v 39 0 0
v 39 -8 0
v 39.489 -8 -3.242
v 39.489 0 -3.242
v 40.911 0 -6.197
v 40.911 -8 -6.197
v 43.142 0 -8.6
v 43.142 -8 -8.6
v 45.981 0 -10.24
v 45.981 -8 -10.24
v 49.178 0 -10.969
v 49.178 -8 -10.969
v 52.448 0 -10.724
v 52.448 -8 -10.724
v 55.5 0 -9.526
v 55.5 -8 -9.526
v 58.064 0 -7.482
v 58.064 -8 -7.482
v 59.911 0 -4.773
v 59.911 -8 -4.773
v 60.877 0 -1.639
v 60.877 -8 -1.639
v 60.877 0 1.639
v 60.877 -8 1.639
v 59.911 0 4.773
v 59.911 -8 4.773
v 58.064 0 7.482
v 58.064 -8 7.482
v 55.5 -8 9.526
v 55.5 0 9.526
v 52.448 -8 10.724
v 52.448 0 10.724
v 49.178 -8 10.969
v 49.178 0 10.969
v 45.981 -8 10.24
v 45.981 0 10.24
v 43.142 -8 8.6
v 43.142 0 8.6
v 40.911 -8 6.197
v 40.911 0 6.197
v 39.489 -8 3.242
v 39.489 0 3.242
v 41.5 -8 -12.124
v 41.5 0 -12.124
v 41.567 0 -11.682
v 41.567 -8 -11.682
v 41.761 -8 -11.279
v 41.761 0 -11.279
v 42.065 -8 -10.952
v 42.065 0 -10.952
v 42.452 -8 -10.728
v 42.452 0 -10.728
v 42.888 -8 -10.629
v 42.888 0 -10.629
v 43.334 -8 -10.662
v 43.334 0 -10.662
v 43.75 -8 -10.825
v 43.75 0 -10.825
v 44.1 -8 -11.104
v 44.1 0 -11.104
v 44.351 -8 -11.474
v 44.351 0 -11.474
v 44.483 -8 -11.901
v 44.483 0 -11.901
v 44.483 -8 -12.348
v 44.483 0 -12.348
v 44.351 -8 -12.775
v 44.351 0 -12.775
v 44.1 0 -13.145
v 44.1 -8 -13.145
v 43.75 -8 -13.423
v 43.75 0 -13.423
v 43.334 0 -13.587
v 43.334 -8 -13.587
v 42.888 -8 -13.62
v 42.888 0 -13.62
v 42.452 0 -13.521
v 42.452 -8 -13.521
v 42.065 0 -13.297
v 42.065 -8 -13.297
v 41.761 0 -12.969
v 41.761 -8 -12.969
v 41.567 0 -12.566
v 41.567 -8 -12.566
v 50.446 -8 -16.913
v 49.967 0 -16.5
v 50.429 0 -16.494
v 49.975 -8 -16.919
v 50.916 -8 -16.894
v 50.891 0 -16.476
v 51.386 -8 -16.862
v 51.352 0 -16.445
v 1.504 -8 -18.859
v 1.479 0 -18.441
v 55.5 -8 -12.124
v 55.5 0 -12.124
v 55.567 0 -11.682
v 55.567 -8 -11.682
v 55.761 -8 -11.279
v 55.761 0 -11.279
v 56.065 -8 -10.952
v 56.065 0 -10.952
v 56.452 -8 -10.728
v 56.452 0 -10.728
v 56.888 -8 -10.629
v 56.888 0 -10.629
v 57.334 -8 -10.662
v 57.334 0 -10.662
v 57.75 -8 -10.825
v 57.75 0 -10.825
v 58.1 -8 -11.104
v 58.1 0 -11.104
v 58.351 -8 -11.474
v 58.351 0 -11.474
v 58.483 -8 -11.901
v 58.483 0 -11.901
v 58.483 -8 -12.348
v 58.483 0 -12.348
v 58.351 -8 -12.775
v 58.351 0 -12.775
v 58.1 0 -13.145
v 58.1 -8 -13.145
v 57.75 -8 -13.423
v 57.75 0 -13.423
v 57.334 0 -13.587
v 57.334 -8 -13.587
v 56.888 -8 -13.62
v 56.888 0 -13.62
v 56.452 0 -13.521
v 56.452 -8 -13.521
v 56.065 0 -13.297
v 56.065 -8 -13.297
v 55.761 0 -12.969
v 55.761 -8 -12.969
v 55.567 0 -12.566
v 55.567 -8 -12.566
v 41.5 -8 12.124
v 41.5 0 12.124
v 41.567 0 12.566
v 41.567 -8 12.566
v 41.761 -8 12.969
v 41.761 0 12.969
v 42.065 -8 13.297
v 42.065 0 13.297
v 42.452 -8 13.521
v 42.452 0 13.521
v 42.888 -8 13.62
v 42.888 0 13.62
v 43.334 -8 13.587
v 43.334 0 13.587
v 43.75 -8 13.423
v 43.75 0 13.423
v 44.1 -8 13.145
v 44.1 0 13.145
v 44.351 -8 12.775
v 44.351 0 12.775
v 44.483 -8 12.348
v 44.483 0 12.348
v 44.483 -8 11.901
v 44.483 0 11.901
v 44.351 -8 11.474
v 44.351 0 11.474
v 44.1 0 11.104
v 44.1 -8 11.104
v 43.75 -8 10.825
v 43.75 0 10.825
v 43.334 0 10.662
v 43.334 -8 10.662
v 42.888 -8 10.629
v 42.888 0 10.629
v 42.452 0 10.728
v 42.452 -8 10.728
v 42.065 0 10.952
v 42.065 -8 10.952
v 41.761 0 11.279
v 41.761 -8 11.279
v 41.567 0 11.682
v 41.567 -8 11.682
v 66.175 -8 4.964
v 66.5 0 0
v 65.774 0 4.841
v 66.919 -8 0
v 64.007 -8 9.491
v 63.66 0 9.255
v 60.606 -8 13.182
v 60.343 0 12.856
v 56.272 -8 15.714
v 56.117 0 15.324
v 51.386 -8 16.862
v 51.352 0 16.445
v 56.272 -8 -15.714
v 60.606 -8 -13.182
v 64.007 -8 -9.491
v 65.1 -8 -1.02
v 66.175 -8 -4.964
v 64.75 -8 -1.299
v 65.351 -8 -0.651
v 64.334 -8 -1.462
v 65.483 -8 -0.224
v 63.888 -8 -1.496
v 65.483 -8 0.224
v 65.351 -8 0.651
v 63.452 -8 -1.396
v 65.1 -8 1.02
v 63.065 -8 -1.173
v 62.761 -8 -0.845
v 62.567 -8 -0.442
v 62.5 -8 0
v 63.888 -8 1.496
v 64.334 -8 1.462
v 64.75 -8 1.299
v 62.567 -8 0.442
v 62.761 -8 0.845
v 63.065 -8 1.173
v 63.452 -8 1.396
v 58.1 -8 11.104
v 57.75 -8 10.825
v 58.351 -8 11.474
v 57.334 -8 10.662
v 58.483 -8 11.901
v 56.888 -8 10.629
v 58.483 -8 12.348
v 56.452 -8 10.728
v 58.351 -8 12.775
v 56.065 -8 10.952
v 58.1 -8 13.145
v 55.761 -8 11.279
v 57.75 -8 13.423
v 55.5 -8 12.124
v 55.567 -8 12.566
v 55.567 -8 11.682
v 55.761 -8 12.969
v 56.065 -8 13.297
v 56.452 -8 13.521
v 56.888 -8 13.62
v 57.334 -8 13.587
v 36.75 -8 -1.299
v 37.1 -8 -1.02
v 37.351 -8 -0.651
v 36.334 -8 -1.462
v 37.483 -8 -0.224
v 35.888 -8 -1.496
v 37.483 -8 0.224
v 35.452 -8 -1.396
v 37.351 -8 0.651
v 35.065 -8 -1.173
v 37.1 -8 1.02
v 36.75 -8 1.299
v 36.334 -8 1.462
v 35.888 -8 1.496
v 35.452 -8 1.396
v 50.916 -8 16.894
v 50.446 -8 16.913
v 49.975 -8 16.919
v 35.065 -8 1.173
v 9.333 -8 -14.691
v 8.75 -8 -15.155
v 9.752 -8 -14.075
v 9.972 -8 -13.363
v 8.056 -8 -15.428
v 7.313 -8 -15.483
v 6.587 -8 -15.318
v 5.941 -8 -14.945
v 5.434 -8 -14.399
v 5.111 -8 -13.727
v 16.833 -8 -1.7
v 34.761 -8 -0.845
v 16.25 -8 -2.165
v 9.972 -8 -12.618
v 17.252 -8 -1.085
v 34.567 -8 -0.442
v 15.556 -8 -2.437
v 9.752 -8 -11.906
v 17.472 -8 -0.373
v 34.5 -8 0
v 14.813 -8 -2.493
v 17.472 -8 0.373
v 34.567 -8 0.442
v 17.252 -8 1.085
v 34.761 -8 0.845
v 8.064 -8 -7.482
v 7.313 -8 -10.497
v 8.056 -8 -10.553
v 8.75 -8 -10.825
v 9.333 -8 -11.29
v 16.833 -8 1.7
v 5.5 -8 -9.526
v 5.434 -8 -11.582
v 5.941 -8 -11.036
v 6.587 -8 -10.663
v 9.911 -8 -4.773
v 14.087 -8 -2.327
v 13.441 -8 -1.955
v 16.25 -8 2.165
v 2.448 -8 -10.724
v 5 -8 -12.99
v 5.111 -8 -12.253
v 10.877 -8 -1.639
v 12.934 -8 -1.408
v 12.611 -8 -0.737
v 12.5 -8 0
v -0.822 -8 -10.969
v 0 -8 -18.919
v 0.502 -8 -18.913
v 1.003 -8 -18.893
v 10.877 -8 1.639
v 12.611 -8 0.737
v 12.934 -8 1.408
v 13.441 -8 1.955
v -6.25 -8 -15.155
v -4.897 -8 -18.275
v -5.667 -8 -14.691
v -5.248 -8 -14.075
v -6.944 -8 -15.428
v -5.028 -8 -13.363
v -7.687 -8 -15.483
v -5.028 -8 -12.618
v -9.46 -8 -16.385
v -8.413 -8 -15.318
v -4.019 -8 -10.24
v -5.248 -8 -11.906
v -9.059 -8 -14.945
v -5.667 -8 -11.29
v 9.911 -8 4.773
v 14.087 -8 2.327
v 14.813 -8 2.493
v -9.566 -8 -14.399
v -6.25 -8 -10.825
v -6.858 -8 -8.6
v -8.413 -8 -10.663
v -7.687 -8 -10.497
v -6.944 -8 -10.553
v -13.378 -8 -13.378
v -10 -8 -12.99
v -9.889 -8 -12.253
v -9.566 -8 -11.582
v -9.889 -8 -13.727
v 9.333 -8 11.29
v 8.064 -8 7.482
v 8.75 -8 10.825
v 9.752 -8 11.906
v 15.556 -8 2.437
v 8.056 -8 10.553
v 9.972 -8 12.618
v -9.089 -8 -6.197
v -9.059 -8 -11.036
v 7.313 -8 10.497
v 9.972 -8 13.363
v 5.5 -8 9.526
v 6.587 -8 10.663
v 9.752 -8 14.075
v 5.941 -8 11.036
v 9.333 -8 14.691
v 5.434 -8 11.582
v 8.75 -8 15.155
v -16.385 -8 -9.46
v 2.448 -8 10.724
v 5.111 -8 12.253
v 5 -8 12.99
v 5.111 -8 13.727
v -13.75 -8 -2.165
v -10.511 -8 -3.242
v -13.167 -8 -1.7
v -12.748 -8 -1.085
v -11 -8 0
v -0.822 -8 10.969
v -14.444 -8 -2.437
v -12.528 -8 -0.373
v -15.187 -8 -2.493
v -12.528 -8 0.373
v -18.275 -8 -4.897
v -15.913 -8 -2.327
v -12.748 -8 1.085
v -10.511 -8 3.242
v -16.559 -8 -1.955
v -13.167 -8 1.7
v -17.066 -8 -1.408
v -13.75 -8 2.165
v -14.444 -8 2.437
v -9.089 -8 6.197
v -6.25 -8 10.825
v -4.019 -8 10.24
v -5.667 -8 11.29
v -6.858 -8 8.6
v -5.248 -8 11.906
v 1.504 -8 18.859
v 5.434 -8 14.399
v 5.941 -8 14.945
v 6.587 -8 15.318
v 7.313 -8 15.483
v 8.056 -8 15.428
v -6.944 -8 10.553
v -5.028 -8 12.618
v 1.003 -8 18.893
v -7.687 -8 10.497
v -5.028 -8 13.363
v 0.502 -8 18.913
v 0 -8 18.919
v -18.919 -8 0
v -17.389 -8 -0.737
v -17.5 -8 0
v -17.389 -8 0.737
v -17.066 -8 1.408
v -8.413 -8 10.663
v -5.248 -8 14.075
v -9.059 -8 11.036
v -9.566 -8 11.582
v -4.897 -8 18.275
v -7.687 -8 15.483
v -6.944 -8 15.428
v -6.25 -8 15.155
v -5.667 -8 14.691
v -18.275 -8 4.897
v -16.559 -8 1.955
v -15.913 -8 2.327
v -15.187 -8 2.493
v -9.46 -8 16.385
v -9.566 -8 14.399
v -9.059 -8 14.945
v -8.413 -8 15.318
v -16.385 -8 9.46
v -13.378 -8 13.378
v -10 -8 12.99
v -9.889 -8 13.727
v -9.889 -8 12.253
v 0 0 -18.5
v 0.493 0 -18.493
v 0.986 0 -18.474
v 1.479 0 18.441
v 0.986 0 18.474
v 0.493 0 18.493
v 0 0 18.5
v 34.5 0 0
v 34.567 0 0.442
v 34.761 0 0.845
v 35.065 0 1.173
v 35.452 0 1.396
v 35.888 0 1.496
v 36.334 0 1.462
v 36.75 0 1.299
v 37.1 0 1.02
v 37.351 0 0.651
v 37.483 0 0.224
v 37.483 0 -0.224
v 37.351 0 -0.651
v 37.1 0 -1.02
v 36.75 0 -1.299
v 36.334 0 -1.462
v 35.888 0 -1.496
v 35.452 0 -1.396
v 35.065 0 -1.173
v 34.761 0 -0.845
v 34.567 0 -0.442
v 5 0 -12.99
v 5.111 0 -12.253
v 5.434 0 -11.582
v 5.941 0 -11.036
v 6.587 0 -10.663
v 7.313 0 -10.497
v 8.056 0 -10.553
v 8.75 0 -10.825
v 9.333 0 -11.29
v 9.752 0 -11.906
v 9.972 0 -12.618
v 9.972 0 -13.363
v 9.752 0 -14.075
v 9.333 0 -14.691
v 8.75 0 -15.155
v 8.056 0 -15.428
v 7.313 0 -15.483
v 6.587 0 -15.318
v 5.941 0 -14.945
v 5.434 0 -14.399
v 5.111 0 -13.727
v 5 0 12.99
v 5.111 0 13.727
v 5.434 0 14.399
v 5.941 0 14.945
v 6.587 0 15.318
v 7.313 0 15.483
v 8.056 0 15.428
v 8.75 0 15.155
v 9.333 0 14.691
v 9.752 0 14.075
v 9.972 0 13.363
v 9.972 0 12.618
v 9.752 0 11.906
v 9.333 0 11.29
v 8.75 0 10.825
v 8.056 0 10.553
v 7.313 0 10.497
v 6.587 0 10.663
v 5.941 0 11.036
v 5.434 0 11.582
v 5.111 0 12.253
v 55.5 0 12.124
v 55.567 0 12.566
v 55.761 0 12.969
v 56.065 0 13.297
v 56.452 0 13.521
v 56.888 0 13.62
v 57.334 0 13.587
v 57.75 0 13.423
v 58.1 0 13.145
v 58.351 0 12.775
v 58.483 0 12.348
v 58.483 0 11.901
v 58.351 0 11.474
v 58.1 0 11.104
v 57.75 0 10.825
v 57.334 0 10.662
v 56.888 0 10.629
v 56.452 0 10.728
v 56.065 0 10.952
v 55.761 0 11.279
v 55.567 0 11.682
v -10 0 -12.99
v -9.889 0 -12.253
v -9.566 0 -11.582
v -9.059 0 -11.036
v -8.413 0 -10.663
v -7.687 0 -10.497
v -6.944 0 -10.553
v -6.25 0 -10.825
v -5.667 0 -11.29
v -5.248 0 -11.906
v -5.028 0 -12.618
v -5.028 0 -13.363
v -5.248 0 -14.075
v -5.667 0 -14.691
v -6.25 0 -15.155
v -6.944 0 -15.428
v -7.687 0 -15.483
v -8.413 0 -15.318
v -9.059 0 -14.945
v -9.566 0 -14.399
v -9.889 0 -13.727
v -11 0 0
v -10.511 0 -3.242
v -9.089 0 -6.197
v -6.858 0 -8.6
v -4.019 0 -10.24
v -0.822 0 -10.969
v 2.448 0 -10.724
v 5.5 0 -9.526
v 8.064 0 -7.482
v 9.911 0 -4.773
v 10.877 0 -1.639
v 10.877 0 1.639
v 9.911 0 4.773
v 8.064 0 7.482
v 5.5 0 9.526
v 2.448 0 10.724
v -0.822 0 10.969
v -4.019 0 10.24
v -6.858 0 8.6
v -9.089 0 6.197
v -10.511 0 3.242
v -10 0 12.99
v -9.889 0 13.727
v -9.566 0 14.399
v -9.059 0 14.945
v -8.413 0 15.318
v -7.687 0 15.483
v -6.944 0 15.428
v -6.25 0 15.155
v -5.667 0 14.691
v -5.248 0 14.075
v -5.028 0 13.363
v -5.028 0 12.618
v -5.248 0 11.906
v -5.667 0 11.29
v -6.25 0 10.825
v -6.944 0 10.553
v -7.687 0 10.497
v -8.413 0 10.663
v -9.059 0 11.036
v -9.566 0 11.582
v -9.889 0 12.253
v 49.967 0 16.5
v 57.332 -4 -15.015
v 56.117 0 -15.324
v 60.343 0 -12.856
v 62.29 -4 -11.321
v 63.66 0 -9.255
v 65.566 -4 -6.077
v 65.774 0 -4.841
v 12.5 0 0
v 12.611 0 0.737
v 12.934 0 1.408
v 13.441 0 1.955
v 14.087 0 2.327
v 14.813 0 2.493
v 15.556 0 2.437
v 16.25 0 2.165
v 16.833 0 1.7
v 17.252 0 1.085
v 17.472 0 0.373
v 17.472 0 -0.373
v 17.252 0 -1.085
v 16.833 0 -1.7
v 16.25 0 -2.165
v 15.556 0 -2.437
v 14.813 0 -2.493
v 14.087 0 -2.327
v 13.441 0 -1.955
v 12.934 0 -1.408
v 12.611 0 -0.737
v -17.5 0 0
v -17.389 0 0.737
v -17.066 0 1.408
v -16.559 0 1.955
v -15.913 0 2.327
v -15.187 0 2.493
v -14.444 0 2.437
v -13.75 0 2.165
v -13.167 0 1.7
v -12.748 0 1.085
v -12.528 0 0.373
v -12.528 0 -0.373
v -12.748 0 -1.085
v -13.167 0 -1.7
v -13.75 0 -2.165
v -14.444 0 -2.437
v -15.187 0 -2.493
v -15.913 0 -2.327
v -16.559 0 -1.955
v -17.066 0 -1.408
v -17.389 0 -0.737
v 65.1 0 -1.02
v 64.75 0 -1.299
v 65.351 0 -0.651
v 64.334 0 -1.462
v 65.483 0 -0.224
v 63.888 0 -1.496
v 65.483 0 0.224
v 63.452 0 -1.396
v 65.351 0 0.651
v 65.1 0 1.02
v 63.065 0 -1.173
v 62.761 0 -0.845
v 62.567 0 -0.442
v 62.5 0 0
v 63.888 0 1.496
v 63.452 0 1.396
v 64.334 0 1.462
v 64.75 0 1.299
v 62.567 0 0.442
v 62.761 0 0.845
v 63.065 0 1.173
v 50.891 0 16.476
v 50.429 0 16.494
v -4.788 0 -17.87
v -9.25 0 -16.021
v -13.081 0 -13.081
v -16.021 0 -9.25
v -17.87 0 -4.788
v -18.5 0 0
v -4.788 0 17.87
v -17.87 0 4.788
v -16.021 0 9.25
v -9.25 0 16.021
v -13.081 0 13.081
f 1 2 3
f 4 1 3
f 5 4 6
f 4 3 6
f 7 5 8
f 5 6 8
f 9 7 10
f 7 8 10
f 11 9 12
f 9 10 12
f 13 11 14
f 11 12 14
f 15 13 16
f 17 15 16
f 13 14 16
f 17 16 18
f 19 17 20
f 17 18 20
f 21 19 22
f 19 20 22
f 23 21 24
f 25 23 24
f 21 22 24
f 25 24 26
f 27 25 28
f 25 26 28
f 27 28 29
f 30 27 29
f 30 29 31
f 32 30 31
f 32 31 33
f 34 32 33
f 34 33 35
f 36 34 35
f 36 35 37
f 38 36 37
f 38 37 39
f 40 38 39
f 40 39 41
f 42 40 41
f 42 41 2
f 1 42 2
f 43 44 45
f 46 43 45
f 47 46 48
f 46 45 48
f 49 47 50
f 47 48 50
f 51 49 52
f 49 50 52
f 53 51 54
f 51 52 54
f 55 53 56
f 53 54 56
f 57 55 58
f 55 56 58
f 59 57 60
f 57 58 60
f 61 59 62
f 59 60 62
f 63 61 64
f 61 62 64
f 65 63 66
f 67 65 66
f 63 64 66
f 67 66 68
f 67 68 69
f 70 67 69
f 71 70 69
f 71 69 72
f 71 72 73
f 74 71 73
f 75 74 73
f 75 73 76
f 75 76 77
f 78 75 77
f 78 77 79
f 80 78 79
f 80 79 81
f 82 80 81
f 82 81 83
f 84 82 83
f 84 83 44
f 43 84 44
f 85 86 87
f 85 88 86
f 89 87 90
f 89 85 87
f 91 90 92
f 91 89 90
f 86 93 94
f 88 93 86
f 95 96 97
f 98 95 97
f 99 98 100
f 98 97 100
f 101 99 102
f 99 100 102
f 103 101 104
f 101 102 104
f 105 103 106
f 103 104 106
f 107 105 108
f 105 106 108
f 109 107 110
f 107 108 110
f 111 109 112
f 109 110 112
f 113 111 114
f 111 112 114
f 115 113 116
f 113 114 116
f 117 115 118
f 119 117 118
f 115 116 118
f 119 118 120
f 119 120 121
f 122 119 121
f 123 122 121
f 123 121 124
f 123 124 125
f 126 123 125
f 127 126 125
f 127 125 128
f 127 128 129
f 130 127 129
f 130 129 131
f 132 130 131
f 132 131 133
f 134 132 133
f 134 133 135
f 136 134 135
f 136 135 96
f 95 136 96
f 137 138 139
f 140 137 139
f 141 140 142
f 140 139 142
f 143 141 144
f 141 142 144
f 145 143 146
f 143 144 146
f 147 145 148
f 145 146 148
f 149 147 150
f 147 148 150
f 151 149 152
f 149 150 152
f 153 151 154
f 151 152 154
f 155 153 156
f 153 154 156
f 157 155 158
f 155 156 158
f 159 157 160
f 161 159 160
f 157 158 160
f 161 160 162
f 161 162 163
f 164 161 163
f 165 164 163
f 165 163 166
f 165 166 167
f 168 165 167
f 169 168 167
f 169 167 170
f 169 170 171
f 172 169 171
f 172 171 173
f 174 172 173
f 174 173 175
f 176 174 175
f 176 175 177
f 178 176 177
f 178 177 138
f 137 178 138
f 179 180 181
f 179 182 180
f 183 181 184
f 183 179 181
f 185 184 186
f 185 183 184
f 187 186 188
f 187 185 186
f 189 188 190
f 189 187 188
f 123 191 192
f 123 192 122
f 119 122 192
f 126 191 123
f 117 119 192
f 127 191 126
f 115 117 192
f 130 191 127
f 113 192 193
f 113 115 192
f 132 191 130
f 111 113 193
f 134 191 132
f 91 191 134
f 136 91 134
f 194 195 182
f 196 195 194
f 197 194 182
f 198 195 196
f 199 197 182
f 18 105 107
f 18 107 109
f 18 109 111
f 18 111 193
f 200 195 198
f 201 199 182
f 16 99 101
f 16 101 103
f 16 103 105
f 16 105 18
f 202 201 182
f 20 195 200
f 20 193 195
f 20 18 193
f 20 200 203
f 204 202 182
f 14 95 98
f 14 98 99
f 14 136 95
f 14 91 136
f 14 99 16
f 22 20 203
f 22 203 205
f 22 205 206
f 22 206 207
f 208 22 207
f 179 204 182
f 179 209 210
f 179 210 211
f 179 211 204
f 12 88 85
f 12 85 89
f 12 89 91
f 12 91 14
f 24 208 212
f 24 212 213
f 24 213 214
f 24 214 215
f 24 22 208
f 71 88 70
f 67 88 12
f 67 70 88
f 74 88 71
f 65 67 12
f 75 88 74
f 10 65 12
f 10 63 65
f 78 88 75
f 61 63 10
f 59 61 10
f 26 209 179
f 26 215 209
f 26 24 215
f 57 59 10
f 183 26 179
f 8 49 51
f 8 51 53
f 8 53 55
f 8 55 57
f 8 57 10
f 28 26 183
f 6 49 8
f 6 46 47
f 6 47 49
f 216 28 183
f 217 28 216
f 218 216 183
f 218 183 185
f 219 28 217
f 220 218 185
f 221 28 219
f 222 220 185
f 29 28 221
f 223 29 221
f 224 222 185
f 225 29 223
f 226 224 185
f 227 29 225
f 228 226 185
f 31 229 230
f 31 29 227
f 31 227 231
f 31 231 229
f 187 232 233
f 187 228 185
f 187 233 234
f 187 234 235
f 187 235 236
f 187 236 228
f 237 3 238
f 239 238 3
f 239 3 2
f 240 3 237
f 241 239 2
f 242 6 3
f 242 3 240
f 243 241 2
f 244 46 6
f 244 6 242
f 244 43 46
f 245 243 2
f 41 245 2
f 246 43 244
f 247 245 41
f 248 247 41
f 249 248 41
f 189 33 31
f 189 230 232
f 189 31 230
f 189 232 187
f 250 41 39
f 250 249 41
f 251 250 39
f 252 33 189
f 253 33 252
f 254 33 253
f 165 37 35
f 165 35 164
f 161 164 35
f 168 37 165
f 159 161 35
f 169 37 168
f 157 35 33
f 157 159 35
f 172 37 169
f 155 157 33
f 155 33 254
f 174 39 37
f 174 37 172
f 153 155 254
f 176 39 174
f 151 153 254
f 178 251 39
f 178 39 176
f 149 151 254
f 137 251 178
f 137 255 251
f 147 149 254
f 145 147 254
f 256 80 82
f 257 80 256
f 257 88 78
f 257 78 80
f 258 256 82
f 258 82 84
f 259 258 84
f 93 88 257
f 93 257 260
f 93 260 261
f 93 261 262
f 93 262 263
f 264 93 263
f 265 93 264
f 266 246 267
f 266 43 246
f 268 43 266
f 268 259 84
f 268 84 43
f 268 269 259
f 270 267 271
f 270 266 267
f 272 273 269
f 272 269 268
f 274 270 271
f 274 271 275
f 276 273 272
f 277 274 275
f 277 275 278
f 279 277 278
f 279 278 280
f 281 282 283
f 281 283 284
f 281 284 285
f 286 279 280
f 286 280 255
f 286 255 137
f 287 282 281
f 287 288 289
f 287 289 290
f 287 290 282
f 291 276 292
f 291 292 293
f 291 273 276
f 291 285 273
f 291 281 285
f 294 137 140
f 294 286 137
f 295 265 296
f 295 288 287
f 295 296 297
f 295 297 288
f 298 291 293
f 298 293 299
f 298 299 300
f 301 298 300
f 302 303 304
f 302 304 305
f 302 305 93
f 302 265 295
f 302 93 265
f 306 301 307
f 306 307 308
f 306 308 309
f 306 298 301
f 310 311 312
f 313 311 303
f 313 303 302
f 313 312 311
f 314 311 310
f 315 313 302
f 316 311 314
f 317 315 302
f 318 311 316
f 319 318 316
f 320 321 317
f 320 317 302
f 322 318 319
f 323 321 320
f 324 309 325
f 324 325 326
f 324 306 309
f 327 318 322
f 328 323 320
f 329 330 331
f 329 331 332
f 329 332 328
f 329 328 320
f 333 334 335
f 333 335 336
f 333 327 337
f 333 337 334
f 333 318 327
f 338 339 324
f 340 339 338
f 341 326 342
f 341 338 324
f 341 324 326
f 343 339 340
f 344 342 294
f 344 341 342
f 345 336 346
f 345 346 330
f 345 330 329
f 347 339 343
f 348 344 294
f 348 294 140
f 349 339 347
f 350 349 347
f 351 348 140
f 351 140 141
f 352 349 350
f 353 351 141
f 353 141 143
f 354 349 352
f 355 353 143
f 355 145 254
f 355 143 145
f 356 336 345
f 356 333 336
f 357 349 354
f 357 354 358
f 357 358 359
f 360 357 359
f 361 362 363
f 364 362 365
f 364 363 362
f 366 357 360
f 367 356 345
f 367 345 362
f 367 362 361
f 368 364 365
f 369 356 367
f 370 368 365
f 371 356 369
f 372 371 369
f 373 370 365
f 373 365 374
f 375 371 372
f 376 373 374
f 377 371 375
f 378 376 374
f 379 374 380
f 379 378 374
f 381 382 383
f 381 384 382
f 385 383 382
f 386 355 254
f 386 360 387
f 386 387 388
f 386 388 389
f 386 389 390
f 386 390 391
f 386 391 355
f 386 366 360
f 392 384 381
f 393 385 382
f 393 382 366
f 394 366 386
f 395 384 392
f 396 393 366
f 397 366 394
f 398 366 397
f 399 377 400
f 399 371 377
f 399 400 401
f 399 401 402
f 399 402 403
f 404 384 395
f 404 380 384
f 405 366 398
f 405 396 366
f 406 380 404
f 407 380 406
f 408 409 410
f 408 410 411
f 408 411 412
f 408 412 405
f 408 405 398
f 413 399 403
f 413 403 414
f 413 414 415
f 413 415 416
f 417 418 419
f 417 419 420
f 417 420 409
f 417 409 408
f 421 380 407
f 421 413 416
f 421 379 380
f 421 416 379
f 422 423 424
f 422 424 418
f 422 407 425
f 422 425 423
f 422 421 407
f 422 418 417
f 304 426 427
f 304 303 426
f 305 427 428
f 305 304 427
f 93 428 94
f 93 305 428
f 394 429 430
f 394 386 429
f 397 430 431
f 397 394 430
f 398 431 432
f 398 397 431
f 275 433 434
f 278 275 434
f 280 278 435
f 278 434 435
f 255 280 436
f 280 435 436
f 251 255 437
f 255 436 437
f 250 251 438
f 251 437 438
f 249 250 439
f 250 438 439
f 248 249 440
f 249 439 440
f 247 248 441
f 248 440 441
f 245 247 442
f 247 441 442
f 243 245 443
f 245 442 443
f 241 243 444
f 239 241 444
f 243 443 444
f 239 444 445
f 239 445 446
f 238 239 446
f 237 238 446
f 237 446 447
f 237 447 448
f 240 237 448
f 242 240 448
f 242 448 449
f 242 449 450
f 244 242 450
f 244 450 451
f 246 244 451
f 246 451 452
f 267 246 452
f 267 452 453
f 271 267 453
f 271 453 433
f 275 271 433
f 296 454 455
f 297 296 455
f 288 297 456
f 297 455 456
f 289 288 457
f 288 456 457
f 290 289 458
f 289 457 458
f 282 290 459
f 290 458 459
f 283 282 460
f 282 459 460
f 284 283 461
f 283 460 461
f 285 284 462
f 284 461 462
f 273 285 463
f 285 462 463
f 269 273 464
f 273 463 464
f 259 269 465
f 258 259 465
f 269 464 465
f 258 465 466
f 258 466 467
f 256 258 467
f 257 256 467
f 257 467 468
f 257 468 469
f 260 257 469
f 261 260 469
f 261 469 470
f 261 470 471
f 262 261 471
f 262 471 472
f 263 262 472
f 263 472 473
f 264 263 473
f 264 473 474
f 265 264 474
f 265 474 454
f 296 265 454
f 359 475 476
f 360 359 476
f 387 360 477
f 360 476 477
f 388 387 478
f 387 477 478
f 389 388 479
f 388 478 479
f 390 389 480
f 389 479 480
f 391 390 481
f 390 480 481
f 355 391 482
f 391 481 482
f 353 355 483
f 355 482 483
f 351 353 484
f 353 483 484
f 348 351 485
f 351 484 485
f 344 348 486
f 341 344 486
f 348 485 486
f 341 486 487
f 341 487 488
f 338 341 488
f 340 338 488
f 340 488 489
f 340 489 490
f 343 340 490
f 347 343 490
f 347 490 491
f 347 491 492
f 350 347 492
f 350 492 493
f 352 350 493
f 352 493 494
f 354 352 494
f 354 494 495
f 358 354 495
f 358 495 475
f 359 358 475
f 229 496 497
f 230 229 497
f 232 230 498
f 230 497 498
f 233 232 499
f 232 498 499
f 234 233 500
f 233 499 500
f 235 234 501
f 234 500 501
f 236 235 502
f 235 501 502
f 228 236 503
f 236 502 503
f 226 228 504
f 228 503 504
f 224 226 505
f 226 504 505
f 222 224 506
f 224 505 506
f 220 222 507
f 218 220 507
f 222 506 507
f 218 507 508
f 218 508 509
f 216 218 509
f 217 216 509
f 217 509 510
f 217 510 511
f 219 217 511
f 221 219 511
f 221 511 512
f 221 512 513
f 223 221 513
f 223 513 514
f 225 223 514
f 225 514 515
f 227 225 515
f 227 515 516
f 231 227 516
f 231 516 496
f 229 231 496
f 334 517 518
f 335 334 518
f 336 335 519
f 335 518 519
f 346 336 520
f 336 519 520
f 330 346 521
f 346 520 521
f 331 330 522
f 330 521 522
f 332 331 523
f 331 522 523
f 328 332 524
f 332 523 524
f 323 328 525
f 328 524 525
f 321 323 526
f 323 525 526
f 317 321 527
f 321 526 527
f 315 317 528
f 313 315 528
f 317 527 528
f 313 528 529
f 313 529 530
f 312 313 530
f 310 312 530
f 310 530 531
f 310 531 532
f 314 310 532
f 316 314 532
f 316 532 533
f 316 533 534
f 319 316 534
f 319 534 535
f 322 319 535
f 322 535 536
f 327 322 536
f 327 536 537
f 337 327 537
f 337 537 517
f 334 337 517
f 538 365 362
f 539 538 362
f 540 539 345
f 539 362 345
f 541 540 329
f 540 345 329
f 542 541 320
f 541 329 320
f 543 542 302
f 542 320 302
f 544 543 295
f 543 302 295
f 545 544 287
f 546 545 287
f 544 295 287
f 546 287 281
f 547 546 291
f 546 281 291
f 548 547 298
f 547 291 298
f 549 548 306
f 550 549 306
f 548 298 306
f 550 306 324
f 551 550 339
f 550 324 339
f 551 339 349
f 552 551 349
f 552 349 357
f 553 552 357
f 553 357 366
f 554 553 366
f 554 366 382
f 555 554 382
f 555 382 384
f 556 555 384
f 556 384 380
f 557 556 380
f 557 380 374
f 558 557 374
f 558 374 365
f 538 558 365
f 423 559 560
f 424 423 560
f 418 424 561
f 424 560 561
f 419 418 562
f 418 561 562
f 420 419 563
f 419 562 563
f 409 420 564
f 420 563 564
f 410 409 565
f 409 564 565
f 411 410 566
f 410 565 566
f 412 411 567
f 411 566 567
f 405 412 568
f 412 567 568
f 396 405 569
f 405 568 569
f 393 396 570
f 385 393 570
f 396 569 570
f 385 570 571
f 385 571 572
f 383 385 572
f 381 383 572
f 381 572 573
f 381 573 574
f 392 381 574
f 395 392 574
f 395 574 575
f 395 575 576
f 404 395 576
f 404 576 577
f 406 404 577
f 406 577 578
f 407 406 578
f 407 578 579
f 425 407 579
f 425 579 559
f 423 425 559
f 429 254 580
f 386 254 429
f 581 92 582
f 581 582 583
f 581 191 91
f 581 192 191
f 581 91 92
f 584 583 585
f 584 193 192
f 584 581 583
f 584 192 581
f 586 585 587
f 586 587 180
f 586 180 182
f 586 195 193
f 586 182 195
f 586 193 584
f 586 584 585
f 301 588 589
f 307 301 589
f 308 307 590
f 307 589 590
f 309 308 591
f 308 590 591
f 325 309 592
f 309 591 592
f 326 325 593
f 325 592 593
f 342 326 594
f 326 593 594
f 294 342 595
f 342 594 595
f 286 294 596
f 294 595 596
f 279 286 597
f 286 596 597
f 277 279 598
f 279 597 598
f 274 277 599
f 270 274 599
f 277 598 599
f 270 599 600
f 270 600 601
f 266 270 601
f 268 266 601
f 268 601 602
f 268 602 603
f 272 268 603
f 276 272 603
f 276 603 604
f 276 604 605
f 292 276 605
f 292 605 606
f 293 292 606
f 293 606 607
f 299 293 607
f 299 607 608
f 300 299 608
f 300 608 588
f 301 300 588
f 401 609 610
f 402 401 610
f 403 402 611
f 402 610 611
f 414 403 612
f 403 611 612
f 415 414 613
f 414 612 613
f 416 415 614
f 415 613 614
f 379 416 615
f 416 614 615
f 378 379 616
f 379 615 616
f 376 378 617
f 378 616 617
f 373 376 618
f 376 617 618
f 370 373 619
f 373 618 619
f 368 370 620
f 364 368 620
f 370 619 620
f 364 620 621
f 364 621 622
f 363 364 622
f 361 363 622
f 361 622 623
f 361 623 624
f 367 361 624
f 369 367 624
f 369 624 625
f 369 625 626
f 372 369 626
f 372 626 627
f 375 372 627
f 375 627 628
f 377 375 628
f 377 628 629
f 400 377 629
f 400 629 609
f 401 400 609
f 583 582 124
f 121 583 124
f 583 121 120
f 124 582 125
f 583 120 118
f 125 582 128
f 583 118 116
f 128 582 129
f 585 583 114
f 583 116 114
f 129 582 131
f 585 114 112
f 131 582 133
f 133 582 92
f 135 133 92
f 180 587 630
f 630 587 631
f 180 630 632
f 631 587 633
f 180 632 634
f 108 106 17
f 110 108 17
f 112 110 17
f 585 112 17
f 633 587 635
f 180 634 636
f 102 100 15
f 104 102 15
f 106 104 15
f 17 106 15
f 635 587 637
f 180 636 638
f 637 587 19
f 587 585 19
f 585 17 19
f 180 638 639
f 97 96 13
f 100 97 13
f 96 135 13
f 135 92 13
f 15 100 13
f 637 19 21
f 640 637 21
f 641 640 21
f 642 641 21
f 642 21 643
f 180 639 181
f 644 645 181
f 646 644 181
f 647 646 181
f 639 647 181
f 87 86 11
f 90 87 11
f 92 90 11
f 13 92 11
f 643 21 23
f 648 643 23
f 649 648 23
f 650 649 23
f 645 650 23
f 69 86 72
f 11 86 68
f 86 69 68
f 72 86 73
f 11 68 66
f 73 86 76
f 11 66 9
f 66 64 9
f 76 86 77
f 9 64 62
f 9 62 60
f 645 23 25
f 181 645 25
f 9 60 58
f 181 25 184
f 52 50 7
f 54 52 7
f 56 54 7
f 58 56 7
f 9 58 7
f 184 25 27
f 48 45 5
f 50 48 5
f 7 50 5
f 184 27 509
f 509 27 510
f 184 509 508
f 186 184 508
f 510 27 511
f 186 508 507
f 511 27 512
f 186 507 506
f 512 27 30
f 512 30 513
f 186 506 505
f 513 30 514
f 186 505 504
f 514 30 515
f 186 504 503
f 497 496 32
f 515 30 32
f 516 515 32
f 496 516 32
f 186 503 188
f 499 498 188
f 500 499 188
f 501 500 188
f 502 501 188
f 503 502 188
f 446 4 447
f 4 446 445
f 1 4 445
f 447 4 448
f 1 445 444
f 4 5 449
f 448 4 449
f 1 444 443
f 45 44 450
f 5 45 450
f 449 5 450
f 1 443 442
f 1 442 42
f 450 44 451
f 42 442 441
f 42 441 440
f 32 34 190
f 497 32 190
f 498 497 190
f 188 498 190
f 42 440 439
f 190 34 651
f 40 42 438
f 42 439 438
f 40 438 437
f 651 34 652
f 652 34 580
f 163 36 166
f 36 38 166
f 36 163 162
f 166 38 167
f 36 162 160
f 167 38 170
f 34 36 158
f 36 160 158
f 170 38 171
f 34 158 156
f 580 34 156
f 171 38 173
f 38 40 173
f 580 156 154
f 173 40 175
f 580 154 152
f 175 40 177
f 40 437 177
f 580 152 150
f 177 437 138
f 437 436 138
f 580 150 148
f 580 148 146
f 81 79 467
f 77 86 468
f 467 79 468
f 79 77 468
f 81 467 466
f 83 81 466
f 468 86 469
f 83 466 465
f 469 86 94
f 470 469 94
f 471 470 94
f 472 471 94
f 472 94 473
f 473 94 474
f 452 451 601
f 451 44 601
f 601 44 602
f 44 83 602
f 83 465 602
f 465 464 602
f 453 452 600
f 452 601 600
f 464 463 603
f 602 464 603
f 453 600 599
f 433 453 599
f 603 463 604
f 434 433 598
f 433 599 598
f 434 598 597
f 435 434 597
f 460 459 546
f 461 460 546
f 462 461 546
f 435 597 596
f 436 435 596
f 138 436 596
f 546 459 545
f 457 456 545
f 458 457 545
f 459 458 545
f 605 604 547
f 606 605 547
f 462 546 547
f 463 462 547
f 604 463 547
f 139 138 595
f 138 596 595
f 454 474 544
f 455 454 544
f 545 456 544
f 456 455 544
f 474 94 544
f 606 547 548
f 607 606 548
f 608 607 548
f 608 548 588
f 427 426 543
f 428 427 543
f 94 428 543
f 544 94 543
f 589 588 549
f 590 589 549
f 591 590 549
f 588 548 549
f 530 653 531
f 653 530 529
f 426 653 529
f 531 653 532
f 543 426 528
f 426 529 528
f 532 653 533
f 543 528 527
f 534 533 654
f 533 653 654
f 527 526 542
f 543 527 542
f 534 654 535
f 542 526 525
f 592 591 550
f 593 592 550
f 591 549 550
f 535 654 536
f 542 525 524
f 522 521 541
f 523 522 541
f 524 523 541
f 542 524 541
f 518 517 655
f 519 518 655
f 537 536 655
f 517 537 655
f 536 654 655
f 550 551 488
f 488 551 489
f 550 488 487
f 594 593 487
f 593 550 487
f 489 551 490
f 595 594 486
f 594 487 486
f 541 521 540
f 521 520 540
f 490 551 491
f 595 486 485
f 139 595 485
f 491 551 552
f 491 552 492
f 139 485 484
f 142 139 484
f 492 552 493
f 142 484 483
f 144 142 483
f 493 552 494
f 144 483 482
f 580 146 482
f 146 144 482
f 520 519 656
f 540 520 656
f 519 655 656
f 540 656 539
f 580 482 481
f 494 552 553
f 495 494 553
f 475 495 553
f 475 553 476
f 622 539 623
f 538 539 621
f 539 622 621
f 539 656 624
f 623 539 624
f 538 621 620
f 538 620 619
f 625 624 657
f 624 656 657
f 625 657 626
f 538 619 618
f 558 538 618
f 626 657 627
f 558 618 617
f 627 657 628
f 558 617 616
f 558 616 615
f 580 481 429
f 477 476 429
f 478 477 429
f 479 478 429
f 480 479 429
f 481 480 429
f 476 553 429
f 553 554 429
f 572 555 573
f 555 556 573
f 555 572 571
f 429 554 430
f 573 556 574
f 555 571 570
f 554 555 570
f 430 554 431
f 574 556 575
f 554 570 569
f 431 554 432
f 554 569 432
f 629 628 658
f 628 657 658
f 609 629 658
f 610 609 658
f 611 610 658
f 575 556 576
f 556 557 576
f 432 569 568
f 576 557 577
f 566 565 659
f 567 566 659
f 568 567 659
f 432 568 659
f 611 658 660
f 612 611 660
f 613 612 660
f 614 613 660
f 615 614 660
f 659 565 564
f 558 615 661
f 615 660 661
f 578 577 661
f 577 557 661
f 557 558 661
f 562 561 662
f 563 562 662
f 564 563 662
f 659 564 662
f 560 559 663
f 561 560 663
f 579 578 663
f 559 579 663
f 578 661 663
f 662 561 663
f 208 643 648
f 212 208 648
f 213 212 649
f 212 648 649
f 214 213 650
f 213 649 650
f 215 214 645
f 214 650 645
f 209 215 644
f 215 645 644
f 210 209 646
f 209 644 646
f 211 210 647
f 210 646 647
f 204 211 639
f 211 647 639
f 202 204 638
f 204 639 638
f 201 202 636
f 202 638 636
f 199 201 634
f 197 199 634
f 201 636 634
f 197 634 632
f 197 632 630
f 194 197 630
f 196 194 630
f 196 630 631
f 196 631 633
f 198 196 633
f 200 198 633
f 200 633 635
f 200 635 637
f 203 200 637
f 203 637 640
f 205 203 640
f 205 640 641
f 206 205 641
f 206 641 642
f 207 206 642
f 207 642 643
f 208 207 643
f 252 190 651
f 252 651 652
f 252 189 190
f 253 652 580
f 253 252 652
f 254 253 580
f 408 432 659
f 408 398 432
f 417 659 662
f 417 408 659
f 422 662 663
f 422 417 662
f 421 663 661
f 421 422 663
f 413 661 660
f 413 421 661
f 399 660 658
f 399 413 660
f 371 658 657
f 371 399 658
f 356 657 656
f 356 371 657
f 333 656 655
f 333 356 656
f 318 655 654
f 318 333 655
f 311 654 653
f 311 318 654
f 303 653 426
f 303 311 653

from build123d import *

# Parameters (mm, degrees)
F1_DEPTH = 8
F1_TAPER = -3
F3_D     = 22
F4_D     = 22
F6_D     = 5
F7_D     = 3


# Not quite as in the source:
# - a feature of the source that left no trace in its solid (it failed there, or was rolled back) is left out


with BuildPart() as f1:
    # F0 (on Front) → F1 (new body)
    with BuildSketch(Plane.XZ):
        with BuildLine():
            Line((1.4786393064, 18.4408141307), (0, 18.5))
            ThreePointArc((0, 18.5), (-18.5, 0), (0, -18.5))
            Line((0, -18.5), (1.4786393064, -18.4408141307))
            ThreePointArc((1.4786393064, -18.4408141307), (13.5942051472, -12.5478120171), (18.5, 0))
            ThreePointArc((18.5, 0), (13.5942051472, 12.5478120171), (1.4786393064, 18.4408141307))
        make_face()
        with BuildLine():
            ThreePointArc((1.4786393064, 18.4408141307), (0.7399116781, 18.4851976108), (0, 18.5))
            Line((0, 18.5), (1.4786393064, 18.4408141307))
        make_face()
        with BuildLine():
            Line((1.4786393064, -18.4408141307), (0, -18.5))
            ThreePointArc((0, -18.5), (0.7399116781, -18.4851976108), (1.4786393064, -18.4408141307))
        make_face()
        with BuildLine():
            Line((49.9667920397, 16.4999665827), (1.4786393064, 18.4408141307))
            ThreePointArc((1.4786393064, 18.4408141307), (13.5942051472, 12.5478120171), (18.5, 0))
            Line((18.5, 0), (33.5, 0))
            ThreePointArc((33.5, 0), (38.3210032249, 11.6555151893), (49.9667920397, 16.4999665827))
        make_face()
        with BuildLine():
            ThreePointArc((18.5, 0), (13.5942051472, -12.5478120171), (1.4786393064, -18.4408141307))
            Line((1.4786393064, -18.4408141307), (49.9667920397, -16.4999665827))
            ThreePointArc((49.9667920397, -16.4999665827), (38.3210032249, -11.6555151893), (33.5, 0))
            Line((33.5, 0), (18.5, 0))
        make_face()
        with BuildLine():
            Line((51.3518854576, 16.4445250983), (49.9667920397, 16.4999665827))
            ThreePointArc((49.9667920397, 16.4999665827), (38.3210032249, 11.6555151893), (33.5, 0))
            ThreePointArc((33.5, 0), (38.3210032249, -11.6555151893), (49.9667920397, -16.4999665827))
            Line((49.9667920397, -16.4999665827), (51.3518854576, -16.4445250983))
            ThreePointArc((51.3518854576, -16.4445250983), (62.1358170316, -11.1790851582), (66.5, 0))
            ThreePointArc((66.5, 0), (62.1358170316, 11.1790851582), (51.3518854576, 16.4445250983))
        make_face()
        with BuildLine():
            ThreePointArc((51.3518854576, 16.4445250983), (50.6599212264, 16.4867978691), (49.9667920397, 16.4999665827))
            Line((49.9667920397, 16.4999665827), (51.3518854576, 16.4445250983))
        make_face()
        with BuildLine():
            Line((51.3518854576, -16.4445250983), (49.9667920397, -16.4999665827))
            ThreePointArc((49.9667920397, -16.4999665827), (50.6599212264, -16.4867978691), (51.3518854576, -16.4445250983))
        make_face()
    extrude(amount=F1_DEPTH, taper=F1_TAPER)

    # F3 (through all)
    with Locations(Plane(origin=(0, 0, 0), x_dir=(1, 0, 0), z_dir=(0, 1, 0))):
        with Locations((50, 0)):
            Hole(F3_D / 2)

    # F4 (through all)
    with Locations(Plane(origin=(0, 0, 0), x_dir=(1, 0, 0), z_dir=(0, 1, 0))):
        with Locations((0, 0)):
            Hole(F4_D / 2)

    # F6 (through all)
    with Locations(Plane.XZ.offset(8)):
        with Locations((15, 0), (7.5, 12.9903810568), (-7.5, 12.9903810568), (-15, 0), (-7.5, -12.9903810568), (7.5, -12.9903810568)):
            Hole(F6_D / 2)

    # F7 (through all)
    with Locations(Plane.XZ.offset(8)):
        with Locations((36, 0), (43, 12.124355653), (57, 12.124355653), (64, 0), (57, -12.124355653), (43, -12.124355653)):
            Hole(F7_D / 2)


solid = f1.part
